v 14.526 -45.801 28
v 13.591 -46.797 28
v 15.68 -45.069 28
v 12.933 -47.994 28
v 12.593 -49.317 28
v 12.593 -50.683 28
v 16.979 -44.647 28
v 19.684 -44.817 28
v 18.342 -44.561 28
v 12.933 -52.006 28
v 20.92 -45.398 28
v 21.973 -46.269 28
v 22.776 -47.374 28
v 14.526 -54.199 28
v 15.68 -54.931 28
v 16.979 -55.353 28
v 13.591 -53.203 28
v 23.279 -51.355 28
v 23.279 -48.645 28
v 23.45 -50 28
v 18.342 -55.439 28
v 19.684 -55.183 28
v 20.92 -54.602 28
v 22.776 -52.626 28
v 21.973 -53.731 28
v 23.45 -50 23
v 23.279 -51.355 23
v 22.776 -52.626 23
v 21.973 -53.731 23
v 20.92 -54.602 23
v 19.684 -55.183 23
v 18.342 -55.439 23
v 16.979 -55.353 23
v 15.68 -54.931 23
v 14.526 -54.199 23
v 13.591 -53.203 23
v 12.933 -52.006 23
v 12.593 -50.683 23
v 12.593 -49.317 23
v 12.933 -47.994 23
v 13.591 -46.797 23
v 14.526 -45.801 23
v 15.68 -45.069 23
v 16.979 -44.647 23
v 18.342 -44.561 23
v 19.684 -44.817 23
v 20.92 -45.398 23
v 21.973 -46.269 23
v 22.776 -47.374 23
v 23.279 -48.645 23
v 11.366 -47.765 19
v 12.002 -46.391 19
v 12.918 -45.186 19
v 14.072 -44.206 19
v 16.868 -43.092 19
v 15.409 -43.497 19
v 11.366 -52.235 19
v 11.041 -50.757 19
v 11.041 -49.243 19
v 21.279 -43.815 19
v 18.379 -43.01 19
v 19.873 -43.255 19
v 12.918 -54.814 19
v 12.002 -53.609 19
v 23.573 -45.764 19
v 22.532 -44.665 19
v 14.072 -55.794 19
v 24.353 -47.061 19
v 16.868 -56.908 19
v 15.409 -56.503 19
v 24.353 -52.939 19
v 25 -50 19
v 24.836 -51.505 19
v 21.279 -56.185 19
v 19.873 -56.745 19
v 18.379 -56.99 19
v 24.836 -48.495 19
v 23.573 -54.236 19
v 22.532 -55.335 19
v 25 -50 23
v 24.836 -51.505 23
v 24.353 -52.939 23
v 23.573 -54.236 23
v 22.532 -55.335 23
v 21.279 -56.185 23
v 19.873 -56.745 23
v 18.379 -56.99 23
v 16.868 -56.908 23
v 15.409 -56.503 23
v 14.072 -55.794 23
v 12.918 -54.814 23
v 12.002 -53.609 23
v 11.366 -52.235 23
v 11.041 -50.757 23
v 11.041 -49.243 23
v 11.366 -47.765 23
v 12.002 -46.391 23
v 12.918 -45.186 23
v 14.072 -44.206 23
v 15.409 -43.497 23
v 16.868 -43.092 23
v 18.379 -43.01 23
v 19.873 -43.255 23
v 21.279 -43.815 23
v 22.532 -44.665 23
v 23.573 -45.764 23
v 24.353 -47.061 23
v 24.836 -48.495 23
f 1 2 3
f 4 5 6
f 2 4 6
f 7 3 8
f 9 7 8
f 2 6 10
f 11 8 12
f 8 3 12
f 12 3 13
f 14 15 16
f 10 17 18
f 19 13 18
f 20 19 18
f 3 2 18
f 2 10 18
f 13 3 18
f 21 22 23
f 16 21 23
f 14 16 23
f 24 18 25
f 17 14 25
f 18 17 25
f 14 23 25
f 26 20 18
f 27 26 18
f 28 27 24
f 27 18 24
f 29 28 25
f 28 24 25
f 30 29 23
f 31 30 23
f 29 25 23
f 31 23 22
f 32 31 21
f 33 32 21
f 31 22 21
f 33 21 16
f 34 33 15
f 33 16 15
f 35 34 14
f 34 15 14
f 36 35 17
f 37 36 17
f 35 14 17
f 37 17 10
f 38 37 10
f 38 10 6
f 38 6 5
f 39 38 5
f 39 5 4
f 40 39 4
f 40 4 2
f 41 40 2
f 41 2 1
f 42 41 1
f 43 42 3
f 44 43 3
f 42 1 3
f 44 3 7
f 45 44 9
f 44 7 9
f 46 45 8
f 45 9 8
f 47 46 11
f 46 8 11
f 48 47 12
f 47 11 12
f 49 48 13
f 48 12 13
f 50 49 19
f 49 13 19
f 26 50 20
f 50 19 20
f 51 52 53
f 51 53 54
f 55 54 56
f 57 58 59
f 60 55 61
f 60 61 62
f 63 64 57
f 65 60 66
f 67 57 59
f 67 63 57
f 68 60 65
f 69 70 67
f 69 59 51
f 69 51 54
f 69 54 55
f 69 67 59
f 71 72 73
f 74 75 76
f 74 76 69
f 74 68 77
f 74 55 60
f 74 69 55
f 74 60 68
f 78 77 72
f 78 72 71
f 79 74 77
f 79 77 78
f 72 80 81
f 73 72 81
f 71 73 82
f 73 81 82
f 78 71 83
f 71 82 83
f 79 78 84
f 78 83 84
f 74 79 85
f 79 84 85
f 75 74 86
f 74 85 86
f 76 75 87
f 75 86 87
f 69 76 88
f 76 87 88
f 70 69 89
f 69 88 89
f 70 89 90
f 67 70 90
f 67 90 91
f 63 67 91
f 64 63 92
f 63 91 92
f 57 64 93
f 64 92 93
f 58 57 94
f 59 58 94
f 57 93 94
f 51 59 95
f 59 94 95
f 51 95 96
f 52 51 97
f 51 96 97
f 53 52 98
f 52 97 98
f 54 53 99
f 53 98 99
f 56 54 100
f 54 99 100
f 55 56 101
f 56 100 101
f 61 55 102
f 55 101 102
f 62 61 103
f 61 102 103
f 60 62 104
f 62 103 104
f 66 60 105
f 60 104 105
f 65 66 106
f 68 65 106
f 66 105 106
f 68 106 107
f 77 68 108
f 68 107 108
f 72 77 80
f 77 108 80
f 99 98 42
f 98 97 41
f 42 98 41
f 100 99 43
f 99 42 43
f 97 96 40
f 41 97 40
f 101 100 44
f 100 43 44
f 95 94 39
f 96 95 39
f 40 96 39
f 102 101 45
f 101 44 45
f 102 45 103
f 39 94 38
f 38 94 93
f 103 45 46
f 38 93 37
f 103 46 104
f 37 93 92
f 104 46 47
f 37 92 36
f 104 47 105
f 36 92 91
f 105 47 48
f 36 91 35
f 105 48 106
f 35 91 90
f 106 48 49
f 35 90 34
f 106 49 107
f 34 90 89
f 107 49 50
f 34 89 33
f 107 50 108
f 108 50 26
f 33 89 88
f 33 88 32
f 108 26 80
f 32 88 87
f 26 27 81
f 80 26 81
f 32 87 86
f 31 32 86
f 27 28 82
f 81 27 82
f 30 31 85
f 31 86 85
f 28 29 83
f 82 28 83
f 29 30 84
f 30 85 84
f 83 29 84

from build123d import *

# Parameters (mm, degrees)
CYLINDER001_R            = 7
CYLINDER001_DEPTH        = 4
CYLINDER_R               = 5.45
CYLINDER_DEPTH           = 5
CLONE018_PLACEMENT_ANGLE = 180


with BuildPart() as knob002:
    # Cylinder001 → Cylinder001 (new body)
    with BuildSketch(Plane(origin=(7, 0, -5), x_dir=(1, 0, 0), z_dir=(0, 0, 1))):
        Circle(CYLINDER001_R)
    extrude(amount=CYLINDER001_DEPTH)


with BuildPart() as knob004:
    # Cylinder → Cylinder (new body)
    with BuildSketch(Plane(origin=(7, 0, -10), x_dir=(1, 0, 0), z_dir=(0, 0, 1))):
        Circle(CYLINDER_R)
    extrude(amount=CYLINDER_DEPTH)

    # Fusion007: union knob002
    add(knob002.part)


with BuildPart() as knob004_1:
    # Clone018 placement: moved
    add(knob004.part.moved(Location((11, -50, 18))).rotate(Axis((11, -50, 18), (1, 0, 0)), CLONE018_PLACEMENT_ANGLE))


solid = knob004_1.part
